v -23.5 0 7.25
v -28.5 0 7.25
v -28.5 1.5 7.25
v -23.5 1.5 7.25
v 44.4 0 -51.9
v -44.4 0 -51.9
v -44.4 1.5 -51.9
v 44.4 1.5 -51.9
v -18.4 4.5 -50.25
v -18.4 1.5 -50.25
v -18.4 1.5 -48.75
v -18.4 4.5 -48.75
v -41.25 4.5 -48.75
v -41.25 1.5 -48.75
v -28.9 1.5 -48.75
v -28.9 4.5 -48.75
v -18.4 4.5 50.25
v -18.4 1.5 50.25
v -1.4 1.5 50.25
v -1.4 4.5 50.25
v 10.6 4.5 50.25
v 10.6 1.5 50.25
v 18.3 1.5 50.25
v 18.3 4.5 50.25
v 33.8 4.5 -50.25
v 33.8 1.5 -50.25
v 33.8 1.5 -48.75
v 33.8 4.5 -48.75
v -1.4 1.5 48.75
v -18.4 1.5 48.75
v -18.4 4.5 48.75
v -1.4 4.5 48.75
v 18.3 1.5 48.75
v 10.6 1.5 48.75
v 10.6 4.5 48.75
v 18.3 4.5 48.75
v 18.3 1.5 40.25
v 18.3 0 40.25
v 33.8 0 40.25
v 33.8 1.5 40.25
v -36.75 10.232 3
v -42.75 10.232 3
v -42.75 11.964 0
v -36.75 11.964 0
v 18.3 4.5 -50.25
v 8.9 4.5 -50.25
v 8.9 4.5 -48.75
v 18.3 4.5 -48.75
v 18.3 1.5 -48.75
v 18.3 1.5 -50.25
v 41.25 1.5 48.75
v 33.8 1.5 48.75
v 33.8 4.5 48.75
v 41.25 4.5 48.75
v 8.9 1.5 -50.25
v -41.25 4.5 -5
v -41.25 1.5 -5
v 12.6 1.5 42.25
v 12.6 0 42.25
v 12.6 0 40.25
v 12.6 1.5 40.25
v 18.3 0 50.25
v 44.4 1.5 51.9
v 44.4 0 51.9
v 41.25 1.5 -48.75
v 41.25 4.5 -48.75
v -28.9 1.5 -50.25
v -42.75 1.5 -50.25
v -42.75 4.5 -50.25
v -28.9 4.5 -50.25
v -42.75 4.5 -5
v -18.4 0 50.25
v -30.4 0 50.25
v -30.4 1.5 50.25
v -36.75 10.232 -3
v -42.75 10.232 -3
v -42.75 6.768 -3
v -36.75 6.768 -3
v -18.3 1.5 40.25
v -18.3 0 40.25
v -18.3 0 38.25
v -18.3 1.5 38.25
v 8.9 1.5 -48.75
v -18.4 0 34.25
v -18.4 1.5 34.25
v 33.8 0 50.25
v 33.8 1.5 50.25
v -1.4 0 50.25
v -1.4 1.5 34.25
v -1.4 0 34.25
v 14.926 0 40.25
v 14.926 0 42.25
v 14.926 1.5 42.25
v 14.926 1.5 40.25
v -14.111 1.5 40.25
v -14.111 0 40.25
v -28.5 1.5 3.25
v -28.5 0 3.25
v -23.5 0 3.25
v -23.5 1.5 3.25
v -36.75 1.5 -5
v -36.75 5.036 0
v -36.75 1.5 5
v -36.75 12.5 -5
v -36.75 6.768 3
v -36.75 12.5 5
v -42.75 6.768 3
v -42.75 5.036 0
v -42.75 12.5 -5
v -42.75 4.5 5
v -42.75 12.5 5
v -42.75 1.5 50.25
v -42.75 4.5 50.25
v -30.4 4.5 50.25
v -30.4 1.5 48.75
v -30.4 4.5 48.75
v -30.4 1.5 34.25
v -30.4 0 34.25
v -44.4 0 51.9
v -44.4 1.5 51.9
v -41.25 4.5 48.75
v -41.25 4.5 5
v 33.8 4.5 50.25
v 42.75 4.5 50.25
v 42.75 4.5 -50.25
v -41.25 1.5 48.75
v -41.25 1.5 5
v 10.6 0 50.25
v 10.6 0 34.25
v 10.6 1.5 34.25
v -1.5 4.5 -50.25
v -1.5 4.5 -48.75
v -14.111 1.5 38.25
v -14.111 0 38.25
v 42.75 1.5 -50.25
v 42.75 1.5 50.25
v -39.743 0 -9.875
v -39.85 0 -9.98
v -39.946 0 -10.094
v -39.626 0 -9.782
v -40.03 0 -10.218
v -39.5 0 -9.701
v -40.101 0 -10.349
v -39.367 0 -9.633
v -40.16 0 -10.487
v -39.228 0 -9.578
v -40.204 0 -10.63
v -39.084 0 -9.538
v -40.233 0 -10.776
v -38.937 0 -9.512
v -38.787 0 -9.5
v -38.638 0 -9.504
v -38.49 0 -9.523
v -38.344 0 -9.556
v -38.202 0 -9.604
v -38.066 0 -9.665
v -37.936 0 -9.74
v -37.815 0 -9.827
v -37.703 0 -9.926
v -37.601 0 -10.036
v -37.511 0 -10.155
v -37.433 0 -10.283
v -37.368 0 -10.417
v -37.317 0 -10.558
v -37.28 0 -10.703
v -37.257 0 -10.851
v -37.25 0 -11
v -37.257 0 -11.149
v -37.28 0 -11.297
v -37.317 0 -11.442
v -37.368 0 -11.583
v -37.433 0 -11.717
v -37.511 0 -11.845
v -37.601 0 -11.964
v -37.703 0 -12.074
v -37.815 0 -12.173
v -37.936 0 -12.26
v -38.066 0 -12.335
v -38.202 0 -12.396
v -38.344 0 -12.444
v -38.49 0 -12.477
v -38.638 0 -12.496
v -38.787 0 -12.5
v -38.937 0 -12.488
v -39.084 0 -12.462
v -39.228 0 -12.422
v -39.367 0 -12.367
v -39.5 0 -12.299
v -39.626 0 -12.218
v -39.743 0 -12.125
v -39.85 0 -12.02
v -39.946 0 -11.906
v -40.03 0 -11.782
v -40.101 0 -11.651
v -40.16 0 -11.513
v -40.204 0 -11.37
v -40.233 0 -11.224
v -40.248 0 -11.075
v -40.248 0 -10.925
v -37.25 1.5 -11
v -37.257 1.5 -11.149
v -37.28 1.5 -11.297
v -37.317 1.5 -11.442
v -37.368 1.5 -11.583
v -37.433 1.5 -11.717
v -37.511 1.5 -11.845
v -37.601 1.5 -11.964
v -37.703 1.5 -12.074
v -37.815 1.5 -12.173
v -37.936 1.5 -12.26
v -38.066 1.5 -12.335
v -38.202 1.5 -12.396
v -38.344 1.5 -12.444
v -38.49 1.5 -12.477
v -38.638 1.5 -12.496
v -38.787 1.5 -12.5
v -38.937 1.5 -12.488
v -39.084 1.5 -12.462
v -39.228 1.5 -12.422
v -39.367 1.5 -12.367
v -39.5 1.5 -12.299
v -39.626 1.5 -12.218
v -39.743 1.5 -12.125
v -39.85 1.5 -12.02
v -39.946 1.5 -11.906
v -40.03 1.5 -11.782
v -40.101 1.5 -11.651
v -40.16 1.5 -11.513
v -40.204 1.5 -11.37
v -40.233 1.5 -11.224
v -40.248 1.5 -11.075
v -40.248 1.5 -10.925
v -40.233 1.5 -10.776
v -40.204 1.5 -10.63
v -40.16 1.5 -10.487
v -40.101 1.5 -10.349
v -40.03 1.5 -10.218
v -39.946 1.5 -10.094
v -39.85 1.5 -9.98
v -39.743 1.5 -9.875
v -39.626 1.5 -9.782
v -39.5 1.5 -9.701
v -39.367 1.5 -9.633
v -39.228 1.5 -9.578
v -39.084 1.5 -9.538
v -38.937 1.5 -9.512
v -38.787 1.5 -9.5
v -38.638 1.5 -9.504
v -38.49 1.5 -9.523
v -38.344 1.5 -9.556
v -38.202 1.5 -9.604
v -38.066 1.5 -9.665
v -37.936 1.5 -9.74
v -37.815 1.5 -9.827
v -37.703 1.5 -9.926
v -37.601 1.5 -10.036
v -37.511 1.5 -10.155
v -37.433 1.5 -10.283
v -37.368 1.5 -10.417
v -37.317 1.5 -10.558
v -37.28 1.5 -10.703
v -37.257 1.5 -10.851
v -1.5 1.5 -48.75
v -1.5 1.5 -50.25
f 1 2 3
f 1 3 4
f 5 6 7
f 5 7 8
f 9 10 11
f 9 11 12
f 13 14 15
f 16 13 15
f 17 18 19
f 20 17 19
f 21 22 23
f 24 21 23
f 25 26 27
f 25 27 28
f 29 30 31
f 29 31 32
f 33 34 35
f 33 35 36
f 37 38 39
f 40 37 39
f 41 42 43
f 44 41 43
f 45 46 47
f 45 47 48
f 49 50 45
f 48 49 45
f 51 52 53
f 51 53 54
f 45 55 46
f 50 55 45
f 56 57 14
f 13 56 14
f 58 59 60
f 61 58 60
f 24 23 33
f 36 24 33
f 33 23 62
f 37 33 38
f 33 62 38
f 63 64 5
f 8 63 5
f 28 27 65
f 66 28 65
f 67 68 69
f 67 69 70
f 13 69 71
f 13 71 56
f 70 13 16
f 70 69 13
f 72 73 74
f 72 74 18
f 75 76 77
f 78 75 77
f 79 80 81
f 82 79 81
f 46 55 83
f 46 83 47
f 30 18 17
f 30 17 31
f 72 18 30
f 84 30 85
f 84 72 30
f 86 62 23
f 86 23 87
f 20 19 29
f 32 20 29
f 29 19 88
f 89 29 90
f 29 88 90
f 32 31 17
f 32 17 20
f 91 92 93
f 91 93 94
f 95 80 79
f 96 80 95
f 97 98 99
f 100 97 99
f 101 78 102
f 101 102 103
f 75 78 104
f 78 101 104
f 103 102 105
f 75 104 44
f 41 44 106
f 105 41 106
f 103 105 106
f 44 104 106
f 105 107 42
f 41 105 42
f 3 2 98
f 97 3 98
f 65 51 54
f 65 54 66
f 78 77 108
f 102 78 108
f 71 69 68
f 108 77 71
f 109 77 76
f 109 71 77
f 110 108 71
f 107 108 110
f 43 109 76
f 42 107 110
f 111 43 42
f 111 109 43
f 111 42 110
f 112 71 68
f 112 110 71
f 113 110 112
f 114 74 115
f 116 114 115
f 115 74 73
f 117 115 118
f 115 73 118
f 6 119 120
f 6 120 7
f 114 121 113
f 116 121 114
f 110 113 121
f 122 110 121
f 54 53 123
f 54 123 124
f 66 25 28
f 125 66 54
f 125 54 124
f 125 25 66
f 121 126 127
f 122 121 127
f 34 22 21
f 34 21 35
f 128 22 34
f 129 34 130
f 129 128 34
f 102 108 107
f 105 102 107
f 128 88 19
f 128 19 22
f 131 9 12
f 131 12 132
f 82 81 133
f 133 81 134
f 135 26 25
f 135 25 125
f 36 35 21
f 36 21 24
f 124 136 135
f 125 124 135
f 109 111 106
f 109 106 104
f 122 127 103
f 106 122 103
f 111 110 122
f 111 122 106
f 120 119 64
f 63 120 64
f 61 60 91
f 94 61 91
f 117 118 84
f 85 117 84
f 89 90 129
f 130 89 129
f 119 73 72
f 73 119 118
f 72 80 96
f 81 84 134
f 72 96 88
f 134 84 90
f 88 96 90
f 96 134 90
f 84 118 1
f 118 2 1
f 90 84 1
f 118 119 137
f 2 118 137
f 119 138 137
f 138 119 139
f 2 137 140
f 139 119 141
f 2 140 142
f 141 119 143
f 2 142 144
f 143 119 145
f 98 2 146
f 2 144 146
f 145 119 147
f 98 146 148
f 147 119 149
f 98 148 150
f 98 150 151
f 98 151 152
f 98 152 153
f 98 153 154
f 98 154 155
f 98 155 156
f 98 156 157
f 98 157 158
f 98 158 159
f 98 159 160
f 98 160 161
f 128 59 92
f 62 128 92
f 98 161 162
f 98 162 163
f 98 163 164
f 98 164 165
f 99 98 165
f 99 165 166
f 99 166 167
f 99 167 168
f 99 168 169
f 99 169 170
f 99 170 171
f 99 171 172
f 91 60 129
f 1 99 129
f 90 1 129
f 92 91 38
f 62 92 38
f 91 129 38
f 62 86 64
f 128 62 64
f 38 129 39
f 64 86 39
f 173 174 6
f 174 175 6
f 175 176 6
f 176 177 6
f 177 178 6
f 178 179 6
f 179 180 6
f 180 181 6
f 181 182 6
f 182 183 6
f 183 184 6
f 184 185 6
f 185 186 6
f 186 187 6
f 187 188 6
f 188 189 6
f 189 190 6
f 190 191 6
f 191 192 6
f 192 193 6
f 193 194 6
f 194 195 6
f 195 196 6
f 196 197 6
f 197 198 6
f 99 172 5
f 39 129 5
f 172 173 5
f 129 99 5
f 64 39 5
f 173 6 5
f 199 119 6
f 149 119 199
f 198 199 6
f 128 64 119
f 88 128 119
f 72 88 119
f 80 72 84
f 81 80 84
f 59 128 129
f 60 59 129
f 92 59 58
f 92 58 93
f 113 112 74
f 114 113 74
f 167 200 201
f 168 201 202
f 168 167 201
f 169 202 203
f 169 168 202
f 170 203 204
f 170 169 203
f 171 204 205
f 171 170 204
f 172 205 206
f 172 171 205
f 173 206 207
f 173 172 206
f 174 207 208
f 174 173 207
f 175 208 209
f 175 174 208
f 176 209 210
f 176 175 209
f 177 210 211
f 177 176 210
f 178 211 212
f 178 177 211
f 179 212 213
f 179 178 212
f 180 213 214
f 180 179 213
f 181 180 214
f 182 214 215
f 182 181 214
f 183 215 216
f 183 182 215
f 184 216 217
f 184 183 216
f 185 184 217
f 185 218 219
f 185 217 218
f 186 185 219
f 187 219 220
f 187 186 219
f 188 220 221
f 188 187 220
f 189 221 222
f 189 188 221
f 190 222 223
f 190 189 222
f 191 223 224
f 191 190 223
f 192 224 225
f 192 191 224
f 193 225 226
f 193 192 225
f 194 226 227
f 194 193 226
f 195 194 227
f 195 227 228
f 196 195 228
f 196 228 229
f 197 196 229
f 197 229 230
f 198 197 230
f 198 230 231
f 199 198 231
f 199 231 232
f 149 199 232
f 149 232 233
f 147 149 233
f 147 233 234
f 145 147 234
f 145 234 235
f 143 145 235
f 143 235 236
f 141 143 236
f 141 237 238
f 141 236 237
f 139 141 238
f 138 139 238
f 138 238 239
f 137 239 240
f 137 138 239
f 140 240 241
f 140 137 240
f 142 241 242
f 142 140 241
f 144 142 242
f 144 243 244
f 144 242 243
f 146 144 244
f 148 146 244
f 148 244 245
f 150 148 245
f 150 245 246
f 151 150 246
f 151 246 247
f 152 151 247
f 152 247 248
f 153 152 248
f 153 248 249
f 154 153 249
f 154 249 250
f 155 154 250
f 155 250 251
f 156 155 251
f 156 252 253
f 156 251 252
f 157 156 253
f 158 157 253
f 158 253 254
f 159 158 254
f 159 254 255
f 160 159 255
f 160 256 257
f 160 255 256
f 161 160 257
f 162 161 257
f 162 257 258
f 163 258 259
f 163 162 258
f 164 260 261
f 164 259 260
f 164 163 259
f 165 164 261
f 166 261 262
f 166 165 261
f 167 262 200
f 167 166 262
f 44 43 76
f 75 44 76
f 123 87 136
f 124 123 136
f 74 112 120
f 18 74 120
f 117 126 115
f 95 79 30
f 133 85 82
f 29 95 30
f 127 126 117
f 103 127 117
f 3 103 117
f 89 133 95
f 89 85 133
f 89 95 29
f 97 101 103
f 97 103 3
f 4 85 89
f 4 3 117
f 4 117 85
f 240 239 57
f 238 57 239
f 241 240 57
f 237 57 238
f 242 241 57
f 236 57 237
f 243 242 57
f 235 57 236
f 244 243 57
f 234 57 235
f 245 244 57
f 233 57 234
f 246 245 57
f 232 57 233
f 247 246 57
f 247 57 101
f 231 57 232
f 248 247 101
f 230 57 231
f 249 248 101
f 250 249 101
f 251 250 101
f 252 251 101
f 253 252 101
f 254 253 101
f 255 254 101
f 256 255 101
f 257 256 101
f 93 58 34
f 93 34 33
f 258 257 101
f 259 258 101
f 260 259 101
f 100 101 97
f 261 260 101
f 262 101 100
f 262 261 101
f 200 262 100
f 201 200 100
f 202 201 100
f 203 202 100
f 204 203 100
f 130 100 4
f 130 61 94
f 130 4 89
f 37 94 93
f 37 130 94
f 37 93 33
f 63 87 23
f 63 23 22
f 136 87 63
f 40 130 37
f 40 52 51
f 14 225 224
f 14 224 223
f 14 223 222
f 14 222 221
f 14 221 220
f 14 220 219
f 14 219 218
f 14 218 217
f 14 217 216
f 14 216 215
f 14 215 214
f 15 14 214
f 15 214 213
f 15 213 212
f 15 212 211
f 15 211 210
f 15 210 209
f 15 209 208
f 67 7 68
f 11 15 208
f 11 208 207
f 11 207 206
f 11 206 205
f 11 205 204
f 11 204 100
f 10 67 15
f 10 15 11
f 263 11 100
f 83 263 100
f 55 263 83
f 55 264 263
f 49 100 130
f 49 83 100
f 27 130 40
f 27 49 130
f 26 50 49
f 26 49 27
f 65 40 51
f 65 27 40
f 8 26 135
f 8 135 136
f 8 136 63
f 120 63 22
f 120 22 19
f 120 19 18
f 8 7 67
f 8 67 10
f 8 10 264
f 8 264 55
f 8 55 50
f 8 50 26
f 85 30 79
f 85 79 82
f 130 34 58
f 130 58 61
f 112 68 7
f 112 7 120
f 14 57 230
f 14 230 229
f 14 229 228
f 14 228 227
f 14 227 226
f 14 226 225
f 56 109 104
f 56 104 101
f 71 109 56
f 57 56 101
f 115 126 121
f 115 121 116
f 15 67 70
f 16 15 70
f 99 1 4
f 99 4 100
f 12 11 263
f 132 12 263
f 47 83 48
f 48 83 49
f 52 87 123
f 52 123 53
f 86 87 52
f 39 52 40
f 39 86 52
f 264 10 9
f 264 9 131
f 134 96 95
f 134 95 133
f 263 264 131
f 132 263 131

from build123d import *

# Parameters (mm, degrees)
SKETCH_1_W          = 88.8
SKETCH_1_H          = 103.8
EXTRUDE_1_DEPTH     = 1.5
SKETCH_2_W          = 85.5
SKETCH_2_H          = 100.5
SKETCH_2_W_2        = 82.5
SKETCH_2_H_2        = 97.5
EXTRUDE_2_DEPTH     = 3
EXTRUDE_3_DEPTH     = 6
SKETCH_6_W          = 10.5
SKETCH_6_H          = 6
SKETCH_6_W_2        = 15.5
SKETCH_6_W_3        = 10.4
CUT_EXTRUDE_2_DEPTH = 1.5
SKETCH_7_R          = 1.5
SKETCH_7_W          = 15.5
SKETCH_7_H          = 10
SKETCH_7_W_2        = 12
SKETCH_7_H_2        = 16
SKETCH_7_W_3        = 2.325623679
SKETCH_7_H_3        = 2
SKETCH_7_W_4        = 4.188972838
SKETCH_7_W_5        = 5
SKETCH_7_H_4        = 4
CUT_EXTRUDE_5_DEPTH = 10


with BuildPart() as part:
    # 草图1 → 凸台-拉伸1 (new body)
    with BuildSketch(Plane(origin=(0, 0, 0), x_dir=(1, 0, 0), z_dir=(0, 1, 0))):
        Rectangle(SKETCH_1_W, SKETCH_1_H)
    extrude(amount=EXTRUDE_1_DEPTH)

    # 草图2 → 凸台-拉伸2 (add)
    with BuildSketch(Plane(origin=(0, 1.5, 0), x_dir=(1, 0, 0), z_dir=(0, 1, 0))):
        Rectangle(SKETCH_2_W, SKETCH_2_H)
        Rectangle(SKETCH_2_W_2, SKETCH_2_H_2, mode=Mode.SUBTRACT)
    extrude(amount=EXTRUDE_2_DEPTH)

    # 草图3 → 凸台-拉伸3 (add)
    with BuildSketch(Plane.ZY.offset(42.75)):
        Polygon((5, 12.5), (-5, 12.5), (-5, 4.5), (-5, 1.5), (5, 1.5), (5, 4.5), align=None)
        Polygon((0, 11.964101615), (-3, 10.232050808), (-3, 6.767949192), (0, 5.035898385), (3, 6.767949192), (3, 10.232050808), align=None, mode=Mode.SUBTRACT)
    extrude(amount=-EXTRUDE_3_DEPTH)

    # 草图6 → 切除-拉伸2 (cut)
    with BuildSketch(Plane(origin=(0, 0, -50.25), x_dir=(-1, 0, 0), z_dir=(0, 0, -1))):
        with Locations((23.65, 4.5)):
            Rectangle(SKETCH_6_W, SKETCH_6_H)
        with Locations((-26.05, 4.5)):
            Rectangle(SKETCH_6_W_2, SKETCH_6_H)
        with Locations((-3.7, 4.5)):
            Rectangle(SKETCH_6_W_3, SKETCH_6_H)
    extrude(amount=-CUT_EXTRUDE_2_DEPTH, mode=Mode.SUBTRACT)

    # 草图7 → 切除-拉伸5 (cut)
    with BuildSketch(Plane(origin=(0, 0, 0), x_dir=(1, 0, 0), z_dir=(0, 1, 0))):
        with Locations((-38.75, 11)):
            Circle(SKETCH_7_R)
        with Locations((26.05, -45.25)):
            Rectangle(SKETCH_7_W, SKETCH_7_H)
        with Locations((4.6, -42.25)):
            Rectangle(SKETCH_7_W_2, SKETCH_7_H_2)
        with Locations((-24.4, -42.25)):
            Rectangle(SKETCH_7_W_2, SKETCH_7_H_2)
        with Locations((13.76281184, -41.25)):
            Rectangle(SKETCH_7_W_3, SKETCH_7_H_3)
        with Locations((-16.205513581, -39.25)):
            Rectangle(SKETCH_7_W_4, SKETCH_7_H_3)
        with Locations((-26, -5.25)):
            Rectangle(SKETCH_7_W_5, SKETCH_7_H_4)
    extrude(amount=CUT_EXTRUDE_5_DEPTH, mode=Mode.SUBTRACT)


solid = part.part
